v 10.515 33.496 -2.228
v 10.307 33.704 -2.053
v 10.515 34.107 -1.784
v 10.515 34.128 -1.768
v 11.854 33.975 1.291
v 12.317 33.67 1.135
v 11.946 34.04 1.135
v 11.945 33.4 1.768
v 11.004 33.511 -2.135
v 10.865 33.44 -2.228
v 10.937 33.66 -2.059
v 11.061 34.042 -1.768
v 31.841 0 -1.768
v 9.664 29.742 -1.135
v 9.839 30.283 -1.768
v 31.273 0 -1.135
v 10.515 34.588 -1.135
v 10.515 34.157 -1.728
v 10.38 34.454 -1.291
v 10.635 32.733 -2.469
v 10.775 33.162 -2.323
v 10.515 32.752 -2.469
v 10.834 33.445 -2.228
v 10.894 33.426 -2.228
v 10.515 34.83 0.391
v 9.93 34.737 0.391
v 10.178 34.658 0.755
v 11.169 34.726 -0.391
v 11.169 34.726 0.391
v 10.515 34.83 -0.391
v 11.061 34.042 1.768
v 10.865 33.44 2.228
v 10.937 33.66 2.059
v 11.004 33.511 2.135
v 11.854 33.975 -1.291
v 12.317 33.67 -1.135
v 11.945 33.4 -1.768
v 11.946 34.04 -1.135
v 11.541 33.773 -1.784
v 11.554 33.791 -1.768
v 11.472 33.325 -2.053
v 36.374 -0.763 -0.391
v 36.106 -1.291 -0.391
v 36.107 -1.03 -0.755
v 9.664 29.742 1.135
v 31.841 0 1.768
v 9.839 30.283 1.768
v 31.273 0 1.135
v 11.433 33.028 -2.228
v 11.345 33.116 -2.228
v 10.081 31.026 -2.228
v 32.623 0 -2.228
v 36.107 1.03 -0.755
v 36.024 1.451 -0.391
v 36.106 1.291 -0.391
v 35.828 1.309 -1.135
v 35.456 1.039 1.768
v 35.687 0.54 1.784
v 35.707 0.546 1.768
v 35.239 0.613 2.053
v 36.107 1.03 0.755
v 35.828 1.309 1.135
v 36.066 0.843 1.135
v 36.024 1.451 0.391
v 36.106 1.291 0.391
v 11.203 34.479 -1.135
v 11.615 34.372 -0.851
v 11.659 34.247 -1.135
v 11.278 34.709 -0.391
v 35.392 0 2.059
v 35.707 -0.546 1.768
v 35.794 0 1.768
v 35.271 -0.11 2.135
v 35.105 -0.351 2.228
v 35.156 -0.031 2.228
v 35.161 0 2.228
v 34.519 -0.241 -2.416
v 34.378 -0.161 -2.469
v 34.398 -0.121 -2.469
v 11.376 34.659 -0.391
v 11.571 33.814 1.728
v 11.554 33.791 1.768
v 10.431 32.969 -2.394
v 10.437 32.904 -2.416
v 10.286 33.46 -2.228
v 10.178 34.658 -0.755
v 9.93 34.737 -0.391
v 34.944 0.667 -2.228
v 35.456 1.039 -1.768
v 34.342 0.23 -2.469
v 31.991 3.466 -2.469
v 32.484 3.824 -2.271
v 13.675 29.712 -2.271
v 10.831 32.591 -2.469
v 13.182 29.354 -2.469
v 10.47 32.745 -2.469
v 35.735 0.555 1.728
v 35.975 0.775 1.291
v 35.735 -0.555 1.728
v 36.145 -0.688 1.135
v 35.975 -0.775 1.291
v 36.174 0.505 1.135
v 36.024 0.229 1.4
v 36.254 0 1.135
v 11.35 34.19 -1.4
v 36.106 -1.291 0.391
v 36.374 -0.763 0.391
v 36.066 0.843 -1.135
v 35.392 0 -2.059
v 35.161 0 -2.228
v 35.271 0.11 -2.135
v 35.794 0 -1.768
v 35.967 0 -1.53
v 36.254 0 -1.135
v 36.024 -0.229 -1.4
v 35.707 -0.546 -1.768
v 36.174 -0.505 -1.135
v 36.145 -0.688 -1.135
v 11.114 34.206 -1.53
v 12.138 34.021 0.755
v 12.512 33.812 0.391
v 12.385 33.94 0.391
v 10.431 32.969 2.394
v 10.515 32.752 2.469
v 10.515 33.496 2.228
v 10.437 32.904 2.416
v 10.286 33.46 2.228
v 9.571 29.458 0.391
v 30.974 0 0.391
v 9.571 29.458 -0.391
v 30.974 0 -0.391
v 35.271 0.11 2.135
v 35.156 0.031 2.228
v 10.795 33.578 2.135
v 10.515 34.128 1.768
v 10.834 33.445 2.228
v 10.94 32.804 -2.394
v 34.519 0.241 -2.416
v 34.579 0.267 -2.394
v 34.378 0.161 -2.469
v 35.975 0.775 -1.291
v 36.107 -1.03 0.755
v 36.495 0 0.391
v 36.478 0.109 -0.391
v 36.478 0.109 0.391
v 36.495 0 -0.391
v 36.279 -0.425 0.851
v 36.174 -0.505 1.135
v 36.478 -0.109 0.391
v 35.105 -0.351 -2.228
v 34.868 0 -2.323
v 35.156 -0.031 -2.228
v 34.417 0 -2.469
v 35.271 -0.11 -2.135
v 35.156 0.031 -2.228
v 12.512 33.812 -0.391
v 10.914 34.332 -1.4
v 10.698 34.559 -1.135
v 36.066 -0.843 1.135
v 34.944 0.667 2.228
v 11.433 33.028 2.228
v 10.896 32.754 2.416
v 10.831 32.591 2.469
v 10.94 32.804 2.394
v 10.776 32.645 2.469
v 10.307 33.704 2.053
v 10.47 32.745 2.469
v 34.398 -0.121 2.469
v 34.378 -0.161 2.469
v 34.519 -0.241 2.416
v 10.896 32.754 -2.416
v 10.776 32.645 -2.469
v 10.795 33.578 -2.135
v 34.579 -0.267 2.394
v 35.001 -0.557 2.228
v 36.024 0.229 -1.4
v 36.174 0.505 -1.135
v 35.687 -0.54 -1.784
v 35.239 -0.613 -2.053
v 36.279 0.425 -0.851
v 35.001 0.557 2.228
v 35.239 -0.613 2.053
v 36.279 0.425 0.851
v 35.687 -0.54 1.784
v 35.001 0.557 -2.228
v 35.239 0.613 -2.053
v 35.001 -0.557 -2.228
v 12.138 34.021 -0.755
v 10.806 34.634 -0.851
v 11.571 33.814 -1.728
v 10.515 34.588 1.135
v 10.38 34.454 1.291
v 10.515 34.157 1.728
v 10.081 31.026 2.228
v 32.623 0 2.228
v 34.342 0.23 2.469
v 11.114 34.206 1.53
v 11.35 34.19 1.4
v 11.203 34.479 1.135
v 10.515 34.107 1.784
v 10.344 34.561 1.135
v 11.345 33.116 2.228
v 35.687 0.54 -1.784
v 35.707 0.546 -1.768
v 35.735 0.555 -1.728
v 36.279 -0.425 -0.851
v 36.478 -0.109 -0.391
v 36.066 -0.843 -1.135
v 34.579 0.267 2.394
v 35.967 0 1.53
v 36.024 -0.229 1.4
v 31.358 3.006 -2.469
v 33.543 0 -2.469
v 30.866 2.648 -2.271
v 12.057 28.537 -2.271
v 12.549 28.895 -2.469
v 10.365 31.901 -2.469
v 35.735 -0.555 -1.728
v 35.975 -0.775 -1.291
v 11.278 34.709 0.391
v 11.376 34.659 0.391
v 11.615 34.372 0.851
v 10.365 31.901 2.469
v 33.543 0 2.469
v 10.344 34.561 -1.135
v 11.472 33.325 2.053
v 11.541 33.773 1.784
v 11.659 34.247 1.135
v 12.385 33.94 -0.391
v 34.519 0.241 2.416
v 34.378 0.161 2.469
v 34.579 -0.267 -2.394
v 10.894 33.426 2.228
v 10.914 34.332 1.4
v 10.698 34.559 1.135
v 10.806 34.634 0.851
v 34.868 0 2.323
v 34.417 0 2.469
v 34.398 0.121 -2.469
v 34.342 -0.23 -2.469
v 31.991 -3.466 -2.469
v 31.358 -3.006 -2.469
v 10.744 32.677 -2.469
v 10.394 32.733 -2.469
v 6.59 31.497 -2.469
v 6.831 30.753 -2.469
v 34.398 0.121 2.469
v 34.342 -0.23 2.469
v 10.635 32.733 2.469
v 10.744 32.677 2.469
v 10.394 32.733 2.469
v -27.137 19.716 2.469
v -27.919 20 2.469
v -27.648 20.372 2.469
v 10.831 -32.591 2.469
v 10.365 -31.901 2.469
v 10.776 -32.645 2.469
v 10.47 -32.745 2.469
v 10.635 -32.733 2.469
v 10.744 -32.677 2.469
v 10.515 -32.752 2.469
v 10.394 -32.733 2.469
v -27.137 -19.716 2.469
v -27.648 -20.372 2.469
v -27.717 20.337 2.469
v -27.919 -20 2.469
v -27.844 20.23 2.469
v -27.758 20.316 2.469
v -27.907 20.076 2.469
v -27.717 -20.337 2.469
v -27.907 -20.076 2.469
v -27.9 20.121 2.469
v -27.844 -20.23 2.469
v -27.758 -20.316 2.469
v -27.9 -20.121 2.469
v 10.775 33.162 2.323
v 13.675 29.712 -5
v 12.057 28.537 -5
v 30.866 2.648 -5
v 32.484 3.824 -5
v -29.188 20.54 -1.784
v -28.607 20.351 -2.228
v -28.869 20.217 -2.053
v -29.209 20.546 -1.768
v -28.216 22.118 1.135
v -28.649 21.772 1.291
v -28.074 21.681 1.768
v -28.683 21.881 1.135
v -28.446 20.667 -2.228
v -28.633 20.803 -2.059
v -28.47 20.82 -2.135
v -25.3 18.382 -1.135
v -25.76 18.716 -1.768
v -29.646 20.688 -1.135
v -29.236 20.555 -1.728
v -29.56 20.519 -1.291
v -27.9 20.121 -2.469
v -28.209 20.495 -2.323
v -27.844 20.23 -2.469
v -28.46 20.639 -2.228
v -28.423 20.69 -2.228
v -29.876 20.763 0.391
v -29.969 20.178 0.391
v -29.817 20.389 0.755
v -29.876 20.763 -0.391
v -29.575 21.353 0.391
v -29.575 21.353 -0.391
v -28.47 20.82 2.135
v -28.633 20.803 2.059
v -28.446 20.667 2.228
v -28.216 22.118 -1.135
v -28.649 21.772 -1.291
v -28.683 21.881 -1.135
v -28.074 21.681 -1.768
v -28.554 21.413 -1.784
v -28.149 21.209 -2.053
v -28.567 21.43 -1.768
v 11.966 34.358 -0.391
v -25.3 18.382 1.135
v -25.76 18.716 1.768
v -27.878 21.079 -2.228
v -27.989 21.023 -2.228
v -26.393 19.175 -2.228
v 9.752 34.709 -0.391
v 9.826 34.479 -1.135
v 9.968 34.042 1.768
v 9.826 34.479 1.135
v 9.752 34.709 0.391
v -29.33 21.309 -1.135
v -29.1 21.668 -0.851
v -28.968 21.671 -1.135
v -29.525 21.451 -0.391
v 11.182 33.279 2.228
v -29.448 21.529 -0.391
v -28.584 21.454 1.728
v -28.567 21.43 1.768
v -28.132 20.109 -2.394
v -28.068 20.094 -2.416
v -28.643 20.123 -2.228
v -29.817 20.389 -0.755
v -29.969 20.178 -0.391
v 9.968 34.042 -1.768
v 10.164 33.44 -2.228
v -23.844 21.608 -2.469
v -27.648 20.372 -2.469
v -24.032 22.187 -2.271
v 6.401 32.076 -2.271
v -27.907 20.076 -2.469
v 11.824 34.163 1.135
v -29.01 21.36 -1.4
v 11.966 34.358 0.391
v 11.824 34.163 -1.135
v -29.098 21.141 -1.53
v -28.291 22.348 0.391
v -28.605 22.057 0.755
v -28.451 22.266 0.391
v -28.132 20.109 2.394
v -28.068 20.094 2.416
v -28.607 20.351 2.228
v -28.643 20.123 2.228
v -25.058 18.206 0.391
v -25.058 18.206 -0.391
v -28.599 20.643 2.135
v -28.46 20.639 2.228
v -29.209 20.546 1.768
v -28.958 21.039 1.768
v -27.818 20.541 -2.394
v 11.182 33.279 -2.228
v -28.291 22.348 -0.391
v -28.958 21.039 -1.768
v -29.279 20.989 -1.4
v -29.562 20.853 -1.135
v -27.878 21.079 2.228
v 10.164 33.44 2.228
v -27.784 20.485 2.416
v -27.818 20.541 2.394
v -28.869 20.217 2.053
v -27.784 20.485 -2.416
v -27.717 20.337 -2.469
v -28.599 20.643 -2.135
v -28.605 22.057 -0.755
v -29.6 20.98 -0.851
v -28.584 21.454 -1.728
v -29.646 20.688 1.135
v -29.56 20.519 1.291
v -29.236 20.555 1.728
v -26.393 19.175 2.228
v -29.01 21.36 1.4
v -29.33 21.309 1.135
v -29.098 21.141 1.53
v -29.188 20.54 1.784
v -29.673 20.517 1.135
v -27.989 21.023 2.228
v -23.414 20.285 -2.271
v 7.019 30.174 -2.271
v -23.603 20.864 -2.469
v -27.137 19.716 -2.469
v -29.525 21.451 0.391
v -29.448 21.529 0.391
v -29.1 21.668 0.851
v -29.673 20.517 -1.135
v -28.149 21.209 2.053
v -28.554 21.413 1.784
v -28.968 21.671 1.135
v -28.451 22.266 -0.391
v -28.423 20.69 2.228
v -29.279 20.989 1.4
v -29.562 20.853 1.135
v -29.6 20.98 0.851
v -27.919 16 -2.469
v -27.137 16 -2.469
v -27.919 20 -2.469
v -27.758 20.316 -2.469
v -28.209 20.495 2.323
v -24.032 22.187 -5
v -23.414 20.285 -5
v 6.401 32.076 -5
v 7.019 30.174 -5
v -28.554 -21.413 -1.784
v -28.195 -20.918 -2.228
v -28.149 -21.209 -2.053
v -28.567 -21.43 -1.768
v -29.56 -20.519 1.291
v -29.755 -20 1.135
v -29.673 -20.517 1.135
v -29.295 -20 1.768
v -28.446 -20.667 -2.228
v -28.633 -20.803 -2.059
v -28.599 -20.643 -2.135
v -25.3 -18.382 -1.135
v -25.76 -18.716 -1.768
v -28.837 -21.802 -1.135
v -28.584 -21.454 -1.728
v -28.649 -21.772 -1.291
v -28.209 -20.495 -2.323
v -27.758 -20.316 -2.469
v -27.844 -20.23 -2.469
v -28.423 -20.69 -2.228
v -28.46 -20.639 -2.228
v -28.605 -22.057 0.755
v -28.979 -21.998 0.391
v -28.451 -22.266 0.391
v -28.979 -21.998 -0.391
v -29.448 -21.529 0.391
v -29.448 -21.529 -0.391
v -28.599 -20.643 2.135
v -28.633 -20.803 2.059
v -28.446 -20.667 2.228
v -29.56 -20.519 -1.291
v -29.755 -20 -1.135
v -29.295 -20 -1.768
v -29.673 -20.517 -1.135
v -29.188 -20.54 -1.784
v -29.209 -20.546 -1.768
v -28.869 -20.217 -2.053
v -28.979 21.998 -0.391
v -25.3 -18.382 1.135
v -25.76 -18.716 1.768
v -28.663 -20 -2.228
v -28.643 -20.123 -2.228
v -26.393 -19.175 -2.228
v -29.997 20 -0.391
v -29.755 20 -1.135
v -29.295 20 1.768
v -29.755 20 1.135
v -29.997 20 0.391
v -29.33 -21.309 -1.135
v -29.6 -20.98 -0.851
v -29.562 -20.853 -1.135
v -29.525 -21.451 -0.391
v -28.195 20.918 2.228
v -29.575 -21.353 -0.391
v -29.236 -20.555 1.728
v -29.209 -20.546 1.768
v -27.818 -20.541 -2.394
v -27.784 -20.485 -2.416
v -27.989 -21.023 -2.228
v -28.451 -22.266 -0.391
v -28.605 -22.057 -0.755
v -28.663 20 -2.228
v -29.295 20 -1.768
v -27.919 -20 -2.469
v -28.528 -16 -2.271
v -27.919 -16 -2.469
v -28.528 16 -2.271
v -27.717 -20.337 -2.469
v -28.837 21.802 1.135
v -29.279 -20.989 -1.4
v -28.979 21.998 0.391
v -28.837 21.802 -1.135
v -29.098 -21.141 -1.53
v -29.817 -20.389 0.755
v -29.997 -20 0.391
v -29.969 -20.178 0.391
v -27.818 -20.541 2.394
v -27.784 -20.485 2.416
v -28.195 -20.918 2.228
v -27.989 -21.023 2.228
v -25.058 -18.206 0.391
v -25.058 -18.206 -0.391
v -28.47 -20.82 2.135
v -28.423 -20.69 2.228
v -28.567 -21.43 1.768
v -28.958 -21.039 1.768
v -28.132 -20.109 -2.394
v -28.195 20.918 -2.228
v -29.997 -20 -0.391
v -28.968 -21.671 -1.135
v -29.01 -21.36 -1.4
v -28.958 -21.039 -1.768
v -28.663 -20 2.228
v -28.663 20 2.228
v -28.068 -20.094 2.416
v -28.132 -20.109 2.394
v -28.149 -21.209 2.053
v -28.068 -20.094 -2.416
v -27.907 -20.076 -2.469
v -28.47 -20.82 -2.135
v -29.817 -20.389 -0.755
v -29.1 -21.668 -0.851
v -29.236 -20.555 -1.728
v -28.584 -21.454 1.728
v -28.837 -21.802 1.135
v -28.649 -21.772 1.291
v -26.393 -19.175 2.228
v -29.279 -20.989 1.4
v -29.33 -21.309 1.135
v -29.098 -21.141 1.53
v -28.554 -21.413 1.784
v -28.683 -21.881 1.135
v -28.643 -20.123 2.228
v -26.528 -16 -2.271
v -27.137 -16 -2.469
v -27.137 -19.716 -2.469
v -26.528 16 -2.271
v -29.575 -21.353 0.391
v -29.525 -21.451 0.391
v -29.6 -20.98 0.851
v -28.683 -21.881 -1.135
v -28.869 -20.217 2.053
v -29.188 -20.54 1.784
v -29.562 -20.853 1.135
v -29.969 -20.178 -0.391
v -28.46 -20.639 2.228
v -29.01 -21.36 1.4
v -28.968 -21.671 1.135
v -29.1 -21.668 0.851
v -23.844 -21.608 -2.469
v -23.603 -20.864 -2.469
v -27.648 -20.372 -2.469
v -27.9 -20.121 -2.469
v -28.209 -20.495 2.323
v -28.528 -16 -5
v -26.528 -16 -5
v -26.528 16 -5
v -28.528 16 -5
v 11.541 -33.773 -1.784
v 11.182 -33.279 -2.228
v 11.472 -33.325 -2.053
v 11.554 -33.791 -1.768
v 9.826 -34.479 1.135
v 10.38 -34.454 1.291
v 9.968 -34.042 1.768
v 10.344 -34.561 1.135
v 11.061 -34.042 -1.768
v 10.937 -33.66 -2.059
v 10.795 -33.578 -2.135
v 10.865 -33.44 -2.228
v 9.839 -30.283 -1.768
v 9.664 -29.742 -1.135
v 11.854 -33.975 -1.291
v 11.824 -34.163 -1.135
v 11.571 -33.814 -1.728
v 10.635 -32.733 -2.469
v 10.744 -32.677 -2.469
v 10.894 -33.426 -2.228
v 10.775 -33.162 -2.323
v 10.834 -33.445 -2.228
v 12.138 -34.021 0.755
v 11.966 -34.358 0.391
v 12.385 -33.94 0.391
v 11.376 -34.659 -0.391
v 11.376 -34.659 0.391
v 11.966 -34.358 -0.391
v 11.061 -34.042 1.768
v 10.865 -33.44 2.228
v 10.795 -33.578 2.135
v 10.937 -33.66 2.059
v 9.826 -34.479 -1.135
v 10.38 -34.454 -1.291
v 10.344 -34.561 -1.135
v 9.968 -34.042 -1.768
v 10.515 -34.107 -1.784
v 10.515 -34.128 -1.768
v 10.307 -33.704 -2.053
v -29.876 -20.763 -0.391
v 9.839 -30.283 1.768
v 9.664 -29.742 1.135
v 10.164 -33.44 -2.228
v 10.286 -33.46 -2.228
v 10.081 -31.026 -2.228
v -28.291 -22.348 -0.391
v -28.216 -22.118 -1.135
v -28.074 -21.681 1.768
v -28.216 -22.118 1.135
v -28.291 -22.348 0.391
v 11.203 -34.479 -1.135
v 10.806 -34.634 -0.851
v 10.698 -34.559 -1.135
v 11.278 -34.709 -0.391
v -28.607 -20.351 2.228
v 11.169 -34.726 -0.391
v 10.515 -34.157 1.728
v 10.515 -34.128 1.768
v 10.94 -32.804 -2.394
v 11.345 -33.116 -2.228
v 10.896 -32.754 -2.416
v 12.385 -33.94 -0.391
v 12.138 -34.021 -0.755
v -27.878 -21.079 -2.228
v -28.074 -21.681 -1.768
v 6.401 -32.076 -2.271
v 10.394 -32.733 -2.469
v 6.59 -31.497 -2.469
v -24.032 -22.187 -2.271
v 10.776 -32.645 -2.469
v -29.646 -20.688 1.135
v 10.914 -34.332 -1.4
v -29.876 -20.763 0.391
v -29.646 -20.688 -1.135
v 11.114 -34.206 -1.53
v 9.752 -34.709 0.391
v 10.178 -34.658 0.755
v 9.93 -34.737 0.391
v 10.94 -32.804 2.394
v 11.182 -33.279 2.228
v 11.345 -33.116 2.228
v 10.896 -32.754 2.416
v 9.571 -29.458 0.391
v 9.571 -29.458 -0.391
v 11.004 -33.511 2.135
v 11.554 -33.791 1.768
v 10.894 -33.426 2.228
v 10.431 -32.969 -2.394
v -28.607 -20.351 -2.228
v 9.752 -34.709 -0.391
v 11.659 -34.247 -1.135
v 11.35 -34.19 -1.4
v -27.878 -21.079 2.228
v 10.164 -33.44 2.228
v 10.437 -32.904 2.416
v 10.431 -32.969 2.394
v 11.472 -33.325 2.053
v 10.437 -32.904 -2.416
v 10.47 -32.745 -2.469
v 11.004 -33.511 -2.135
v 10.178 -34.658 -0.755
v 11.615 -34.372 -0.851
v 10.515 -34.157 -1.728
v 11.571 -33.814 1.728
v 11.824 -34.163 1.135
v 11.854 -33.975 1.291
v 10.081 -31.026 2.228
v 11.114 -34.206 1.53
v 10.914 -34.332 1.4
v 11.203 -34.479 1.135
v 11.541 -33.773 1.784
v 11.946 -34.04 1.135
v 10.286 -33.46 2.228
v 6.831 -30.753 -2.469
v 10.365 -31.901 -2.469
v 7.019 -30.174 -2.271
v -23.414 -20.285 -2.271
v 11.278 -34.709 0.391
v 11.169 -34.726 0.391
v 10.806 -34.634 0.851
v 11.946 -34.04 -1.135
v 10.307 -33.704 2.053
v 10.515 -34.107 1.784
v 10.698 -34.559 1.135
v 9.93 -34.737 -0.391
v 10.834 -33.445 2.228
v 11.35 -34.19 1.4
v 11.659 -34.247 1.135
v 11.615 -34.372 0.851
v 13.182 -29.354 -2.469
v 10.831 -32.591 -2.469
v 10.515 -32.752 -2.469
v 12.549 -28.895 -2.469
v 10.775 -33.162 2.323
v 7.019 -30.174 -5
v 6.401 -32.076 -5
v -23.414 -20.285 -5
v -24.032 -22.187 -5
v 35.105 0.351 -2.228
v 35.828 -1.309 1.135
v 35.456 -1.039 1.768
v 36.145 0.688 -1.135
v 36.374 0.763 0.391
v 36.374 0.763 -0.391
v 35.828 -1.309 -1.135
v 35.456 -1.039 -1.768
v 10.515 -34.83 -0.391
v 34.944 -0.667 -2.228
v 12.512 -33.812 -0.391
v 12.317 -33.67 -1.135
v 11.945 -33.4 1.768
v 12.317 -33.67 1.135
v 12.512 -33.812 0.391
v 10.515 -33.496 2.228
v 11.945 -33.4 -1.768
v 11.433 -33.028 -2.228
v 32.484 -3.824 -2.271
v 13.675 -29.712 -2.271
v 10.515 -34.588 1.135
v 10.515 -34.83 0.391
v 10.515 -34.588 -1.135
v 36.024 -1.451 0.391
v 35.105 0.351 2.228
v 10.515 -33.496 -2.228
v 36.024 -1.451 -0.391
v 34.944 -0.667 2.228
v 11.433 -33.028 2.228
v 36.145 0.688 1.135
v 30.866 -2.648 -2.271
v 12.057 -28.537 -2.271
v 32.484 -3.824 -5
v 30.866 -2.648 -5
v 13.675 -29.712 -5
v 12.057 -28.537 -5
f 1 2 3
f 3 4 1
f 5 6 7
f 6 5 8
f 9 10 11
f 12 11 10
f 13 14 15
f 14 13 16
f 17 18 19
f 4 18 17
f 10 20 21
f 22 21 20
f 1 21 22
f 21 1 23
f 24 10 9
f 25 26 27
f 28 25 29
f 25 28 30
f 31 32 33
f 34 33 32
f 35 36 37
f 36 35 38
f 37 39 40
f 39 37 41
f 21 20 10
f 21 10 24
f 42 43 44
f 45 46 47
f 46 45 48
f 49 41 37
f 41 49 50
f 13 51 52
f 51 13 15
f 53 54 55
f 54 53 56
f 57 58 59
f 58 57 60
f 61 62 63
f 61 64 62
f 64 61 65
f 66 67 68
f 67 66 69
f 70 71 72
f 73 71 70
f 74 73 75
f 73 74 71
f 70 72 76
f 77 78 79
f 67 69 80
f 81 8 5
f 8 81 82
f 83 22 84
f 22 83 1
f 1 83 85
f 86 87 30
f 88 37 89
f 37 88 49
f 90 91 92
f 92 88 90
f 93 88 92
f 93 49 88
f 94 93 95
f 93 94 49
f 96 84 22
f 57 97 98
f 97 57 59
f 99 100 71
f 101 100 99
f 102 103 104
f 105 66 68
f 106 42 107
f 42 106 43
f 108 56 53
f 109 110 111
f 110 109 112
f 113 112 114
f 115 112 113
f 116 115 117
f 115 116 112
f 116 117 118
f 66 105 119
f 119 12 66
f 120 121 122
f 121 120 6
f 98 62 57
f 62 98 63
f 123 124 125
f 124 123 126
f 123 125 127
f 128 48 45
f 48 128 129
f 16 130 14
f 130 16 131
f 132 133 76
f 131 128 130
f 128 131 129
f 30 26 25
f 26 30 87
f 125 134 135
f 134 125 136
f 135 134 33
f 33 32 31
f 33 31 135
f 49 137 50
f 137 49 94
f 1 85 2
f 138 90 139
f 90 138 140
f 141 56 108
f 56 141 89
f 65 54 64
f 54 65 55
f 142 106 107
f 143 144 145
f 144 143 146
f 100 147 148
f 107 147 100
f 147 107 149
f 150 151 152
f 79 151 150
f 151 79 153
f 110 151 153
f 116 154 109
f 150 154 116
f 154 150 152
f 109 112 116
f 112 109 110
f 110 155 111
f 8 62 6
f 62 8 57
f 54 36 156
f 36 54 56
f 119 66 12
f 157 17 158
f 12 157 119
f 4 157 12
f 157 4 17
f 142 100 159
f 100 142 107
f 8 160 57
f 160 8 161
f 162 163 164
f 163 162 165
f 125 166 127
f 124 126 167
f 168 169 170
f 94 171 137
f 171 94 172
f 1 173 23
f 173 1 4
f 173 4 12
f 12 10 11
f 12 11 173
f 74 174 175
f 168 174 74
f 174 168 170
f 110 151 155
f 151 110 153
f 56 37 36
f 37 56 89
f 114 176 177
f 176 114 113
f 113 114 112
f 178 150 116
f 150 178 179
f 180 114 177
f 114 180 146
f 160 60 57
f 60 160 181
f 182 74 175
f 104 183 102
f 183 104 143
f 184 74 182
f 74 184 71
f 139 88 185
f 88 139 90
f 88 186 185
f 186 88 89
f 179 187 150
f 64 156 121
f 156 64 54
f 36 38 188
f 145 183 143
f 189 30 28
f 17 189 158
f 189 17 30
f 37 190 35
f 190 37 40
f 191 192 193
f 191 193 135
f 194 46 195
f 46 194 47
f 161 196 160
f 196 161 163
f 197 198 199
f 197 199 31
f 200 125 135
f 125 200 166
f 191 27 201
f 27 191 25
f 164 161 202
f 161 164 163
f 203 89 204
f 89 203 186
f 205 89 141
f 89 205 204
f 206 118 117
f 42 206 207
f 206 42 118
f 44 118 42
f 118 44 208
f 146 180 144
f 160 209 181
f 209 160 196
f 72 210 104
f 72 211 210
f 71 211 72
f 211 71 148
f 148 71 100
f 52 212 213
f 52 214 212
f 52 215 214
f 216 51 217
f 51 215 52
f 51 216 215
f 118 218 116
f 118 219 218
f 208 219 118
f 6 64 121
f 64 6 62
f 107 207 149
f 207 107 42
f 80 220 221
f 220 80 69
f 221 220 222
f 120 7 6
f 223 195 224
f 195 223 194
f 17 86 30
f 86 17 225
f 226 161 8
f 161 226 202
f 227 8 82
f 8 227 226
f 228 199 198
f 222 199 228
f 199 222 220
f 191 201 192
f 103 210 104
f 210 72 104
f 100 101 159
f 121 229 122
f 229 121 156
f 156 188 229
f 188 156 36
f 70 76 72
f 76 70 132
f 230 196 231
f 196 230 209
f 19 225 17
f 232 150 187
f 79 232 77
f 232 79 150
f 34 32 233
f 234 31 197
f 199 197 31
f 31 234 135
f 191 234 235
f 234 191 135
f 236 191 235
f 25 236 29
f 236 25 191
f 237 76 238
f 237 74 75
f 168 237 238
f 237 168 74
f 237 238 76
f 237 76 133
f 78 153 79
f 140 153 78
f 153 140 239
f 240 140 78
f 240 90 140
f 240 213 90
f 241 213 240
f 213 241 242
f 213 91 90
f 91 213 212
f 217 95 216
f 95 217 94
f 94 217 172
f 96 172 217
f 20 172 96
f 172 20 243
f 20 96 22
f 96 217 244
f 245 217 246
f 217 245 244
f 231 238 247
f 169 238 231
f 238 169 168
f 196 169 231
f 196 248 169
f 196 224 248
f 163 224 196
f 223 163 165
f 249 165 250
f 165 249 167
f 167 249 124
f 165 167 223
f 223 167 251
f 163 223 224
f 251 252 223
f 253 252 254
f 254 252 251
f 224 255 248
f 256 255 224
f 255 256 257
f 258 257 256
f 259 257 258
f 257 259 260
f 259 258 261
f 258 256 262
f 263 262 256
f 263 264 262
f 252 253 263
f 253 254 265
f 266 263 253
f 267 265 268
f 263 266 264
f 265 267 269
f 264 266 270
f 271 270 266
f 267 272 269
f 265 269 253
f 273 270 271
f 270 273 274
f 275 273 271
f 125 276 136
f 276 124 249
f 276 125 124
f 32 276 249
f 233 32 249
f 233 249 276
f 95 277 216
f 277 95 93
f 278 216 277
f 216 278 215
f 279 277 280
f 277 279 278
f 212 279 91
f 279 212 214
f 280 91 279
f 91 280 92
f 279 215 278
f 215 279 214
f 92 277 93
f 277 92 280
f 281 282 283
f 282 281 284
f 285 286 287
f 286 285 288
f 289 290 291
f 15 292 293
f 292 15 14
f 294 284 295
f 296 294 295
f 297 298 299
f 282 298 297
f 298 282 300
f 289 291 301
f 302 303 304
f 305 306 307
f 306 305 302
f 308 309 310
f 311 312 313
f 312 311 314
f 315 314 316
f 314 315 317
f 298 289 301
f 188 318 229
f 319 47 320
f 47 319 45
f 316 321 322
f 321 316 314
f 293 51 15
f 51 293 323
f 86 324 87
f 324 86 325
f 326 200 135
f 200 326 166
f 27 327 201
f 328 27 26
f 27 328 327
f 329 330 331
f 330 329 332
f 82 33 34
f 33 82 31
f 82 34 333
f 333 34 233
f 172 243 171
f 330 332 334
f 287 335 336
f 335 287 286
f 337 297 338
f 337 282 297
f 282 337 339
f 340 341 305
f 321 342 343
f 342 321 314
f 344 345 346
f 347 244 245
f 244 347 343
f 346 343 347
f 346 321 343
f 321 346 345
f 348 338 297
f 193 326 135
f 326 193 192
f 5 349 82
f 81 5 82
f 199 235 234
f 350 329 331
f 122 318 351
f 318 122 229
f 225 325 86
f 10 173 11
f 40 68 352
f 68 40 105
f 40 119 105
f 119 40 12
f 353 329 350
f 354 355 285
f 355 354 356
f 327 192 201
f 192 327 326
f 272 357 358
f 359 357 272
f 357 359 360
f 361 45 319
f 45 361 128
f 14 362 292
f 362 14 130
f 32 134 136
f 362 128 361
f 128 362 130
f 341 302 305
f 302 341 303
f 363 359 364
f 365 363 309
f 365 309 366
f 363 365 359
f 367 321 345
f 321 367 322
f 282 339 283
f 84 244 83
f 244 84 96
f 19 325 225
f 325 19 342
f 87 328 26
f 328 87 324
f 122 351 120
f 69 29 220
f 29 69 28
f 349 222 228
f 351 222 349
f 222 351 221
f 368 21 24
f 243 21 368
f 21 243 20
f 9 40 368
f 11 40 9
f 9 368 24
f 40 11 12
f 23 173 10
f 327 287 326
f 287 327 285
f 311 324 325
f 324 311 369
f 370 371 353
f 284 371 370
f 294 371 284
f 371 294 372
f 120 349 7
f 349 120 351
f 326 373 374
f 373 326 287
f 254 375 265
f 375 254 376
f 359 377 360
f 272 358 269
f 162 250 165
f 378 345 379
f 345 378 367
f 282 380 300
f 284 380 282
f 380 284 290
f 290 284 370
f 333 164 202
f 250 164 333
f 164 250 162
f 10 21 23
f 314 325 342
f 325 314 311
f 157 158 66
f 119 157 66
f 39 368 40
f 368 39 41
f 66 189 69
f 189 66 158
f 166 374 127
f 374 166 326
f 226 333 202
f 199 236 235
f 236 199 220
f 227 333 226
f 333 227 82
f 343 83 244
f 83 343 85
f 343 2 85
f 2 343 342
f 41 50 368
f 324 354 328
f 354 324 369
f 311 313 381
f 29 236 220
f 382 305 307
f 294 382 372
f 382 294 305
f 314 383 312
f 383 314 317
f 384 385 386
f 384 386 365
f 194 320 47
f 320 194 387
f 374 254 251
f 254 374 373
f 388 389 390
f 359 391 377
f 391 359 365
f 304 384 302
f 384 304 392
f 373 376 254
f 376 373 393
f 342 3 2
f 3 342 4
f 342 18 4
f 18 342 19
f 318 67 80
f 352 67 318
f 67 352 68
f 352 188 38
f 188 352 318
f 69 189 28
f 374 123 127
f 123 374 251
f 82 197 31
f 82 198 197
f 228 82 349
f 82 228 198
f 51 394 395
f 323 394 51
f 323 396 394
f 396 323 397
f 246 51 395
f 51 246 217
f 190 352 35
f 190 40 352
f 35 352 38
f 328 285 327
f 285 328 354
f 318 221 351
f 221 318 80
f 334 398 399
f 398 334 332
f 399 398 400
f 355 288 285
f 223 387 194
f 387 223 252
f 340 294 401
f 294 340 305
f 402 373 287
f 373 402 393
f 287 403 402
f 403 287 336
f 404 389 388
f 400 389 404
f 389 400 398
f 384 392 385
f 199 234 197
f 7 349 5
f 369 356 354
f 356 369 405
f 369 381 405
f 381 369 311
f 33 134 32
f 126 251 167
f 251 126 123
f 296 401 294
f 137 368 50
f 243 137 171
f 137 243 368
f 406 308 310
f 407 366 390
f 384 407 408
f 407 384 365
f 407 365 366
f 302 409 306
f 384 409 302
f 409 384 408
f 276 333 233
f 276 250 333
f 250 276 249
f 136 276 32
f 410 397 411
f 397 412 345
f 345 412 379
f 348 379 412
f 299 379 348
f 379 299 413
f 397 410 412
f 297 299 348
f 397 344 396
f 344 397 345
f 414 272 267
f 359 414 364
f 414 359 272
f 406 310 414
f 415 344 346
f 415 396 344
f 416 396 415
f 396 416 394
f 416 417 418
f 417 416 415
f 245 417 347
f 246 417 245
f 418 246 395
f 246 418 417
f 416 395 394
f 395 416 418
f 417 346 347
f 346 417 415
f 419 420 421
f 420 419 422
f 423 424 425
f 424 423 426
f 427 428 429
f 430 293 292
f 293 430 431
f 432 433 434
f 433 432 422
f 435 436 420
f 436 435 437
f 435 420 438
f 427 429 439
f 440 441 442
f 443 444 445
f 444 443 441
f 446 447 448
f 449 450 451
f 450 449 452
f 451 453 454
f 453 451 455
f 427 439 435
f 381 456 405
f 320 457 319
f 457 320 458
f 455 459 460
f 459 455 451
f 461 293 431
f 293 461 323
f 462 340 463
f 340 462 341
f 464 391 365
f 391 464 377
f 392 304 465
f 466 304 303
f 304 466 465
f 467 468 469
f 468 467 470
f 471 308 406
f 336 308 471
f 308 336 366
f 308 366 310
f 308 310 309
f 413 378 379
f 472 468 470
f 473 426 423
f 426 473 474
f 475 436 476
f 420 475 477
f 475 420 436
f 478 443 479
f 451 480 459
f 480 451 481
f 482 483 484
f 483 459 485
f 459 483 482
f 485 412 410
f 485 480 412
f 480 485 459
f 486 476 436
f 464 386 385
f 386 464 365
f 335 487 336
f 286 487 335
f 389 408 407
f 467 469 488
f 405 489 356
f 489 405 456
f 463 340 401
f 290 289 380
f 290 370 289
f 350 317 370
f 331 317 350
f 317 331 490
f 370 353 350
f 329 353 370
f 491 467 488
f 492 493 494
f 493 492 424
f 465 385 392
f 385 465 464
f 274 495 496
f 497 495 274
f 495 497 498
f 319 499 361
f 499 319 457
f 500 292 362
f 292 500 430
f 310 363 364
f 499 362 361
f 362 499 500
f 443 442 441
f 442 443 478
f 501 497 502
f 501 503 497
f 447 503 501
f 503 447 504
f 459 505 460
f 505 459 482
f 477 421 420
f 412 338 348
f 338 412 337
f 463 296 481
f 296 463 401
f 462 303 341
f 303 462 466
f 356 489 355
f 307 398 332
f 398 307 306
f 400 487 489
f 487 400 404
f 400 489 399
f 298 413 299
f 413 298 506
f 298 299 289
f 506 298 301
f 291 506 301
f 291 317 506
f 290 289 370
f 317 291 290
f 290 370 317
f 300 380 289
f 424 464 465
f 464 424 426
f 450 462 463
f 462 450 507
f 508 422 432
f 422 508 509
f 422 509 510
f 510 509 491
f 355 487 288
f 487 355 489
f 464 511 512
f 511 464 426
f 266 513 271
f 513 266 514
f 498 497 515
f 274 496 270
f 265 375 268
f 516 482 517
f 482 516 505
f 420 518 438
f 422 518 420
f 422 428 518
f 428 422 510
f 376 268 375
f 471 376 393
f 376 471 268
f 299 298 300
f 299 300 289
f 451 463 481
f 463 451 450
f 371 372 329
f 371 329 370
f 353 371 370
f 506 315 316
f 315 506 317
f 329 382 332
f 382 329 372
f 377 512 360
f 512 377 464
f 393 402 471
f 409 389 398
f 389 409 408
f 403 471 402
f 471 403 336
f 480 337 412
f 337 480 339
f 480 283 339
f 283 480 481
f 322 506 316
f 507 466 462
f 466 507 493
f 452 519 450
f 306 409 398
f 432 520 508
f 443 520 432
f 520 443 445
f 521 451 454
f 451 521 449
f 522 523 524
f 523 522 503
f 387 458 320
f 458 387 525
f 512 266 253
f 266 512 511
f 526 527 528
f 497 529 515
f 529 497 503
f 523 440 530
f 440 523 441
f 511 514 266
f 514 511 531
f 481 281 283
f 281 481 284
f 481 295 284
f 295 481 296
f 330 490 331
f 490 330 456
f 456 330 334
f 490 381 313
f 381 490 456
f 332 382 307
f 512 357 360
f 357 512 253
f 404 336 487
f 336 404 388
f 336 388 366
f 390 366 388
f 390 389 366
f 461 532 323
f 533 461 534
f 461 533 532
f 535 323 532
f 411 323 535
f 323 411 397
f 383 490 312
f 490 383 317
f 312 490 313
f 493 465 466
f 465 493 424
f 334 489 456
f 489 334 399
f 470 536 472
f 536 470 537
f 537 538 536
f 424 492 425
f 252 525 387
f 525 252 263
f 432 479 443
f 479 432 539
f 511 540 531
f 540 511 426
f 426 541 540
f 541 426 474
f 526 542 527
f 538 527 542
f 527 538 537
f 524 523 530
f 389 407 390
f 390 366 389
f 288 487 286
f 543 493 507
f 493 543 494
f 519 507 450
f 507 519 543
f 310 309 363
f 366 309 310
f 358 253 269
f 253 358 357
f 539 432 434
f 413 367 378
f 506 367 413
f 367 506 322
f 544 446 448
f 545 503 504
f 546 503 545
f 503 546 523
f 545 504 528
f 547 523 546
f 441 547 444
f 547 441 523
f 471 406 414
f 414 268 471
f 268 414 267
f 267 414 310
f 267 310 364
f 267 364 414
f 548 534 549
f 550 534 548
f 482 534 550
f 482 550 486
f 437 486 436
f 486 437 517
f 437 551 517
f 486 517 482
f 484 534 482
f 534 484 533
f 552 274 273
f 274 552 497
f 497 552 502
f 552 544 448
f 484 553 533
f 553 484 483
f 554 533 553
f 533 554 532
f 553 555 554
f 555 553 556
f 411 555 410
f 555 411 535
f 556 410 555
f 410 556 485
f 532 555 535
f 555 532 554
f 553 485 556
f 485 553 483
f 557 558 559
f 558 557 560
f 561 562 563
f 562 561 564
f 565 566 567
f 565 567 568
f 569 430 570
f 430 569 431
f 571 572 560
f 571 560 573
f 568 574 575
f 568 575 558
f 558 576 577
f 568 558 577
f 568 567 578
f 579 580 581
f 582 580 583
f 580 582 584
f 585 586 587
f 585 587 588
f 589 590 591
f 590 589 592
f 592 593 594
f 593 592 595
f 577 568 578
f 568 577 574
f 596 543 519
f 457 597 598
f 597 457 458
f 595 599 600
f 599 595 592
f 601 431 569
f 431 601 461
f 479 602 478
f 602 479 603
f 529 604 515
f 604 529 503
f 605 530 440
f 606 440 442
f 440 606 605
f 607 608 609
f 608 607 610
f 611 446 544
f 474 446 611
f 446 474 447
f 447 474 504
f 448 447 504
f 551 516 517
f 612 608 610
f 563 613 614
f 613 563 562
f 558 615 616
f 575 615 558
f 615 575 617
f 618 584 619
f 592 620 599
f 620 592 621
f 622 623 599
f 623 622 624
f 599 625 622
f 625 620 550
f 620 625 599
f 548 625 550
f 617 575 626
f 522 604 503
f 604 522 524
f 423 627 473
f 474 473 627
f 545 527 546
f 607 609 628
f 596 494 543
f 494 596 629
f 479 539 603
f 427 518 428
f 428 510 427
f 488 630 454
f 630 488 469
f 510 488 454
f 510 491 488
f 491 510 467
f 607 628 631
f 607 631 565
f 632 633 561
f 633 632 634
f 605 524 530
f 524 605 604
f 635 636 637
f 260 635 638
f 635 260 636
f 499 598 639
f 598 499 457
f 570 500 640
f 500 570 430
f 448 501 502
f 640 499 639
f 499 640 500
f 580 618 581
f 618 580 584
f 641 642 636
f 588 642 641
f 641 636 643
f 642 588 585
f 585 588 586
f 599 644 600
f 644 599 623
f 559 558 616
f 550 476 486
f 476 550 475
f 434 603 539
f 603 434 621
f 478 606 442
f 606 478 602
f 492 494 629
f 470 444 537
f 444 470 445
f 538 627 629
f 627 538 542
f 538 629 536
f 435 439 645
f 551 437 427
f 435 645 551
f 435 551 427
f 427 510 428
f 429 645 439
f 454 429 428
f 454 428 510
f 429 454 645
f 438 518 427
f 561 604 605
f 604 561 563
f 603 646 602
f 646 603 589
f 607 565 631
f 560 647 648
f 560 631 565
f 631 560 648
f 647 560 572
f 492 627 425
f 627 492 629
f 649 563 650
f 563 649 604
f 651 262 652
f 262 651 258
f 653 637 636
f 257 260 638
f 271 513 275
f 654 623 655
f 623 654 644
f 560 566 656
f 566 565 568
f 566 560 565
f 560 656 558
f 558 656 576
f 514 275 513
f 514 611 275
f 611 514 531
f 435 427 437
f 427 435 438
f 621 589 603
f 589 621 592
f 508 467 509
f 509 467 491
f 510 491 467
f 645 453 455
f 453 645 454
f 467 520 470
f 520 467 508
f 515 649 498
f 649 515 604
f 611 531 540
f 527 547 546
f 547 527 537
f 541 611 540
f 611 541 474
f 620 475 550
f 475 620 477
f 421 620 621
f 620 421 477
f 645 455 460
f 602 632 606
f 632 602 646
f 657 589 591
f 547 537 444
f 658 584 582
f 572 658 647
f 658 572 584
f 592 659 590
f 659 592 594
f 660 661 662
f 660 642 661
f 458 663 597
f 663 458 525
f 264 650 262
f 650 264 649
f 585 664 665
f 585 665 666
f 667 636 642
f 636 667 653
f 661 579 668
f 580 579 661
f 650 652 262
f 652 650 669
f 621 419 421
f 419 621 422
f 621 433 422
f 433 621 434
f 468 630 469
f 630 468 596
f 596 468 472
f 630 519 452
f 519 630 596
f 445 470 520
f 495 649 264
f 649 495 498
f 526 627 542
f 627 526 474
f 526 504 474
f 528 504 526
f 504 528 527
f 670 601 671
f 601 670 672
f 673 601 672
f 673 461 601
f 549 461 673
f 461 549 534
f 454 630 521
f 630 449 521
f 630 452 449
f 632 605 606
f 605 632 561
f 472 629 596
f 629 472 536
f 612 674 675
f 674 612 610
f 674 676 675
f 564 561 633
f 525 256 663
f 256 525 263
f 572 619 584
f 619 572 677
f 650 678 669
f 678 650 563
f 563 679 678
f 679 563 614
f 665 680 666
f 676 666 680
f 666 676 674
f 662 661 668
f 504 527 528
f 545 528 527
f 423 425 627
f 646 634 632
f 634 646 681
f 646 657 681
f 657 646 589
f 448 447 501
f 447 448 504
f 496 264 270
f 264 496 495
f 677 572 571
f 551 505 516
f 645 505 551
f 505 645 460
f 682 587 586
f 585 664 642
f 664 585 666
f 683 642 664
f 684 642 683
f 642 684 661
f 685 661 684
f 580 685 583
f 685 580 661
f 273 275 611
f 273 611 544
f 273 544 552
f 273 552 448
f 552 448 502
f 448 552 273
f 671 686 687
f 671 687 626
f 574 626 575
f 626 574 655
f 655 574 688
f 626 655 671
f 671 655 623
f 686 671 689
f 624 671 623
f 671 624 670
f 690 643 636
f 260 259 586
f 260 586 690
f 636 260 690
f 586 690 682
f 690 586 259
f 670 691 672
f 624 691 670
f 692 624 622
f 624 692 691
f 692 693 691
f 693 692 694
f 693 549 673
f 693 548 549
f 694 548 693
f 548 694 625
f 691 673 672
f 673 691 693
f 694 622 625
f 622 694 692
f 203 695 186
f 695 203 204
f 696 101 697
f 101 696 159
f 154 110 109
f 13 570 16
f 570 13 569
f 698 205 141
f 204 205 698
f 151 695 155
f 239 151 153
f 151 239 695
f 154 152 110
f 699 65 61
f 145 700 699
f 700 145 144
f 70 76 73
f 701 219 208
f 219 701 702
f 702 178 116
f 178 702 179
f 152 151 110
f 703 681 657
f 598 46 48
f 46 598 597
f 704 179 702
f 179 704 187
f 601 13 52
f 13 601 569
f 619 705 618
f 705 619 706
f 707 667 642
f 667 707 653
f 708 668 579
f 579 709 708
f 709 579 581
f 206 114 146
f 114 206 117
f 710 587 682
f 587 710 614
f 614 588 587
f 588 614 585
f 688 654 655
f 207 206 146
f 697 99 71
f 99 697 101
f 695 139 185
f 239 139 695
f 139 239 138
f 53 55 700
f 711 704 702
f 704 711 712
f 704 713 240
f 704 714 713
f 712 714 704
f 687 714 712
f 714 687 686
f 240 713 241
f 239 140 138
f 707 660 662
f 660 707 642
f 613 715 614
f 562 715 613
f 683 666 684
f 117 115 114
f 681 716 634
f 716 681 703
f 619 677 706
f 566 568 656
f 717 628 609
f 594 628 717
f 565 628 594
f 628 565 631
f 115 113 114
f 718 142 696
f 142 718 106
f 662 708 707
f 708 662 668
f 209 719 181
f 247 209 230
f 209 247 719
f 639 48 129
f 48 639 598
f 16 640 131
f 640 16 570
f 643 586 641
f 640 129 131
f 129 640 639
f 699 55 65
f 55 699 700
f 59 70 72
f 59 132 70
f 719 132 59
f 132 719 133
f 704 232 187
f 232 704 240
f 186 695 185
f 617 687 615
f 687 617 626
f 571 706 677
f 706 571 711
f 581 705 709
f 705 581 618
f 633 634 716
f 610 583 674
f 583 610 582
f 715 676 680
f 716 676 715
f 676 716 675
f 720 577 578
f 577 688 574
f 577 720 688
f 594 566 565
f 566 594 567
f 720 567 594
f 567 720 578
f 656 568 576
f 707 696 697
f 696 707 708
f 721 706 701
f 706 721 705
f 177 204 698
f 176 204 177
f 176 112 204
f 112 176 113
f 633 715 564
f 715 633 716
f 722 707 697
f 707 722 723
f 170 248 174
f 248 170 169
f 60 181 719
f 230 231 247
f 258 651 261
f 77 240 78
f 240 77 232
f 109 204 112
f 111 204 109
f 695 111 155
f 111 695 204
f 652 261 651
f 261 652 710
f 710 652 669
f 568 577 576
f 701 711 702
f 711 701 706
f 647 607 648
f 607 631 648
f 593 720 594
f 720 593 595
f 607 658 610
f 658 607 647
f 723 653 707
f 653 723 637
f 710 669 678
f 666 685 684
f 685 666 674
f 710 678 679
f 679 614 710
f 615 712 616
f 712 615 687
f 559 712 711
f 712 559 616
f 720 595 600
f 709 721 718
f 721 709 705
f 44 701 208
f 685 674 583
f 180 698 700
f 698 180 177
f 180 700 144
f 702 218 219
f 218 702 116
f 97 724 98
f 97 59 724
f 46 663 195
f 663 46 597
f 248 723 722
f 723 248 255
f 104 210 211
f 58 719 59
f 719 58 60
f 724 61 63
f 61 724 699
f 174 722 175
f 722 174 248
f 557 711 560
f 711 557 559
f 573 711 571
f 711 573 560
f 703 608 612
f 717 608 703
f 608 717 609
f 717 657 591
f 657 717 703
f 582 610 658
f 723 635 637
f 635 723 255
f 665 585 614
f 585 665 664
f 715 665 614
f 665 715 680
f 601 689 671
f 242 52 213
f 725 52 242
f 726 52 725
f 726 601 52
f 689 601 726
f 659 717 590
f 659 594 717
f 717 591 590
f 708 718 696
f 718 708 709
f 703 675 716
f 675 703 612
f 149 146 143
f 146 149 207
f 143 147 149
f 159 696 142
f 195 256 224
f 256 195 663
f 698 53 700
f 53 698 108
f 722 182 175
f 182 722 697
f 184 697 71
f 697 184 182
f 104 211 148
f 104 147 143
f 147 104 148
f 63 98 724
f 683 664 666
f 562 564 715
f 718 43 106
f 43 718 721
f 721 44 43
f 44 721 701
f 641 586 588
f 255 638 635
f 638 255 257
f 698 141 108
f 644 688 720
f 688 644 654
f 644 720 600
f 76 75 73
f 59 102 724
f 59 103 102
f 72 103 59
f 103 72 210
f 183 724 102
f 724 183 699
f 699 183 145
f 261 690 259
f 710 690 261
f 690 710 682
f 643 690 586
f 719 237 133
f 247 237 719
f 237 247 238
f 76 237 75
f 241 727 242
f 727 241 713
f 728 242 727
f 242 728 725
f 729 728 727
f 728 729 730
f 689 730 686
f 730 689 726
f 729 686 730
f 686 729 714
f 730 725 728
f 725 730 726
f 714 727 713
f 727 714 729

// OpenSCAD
// file: polygon-sym.scad
use <funcs.scad>

/**
Applies polygonal symmetry to the supplied children in the X-Y plane. The child objects are repeated to create an instance per vertex and rotating each so their X-axis points along the edge. 
*/
module apply_polygon_sym(n_vertex, polygon_rad) {
    rot_angle = 360 / n_vertex;
    turn_angle = 90 + rot_angle / 2; 
    for (i = [0: n_vertex-1]) {
        $pgn_edge_idx = i;
        rotate([0, 0, rot_angle * i]) {
            translate([polygon_rad, 0, 0]) {
                rotate([0, 0, turn_angle]) {
                    children();
                }
            }
        }
    }
}


module regular_polygon_2d(n_vertex, edge_len) {
    polygon_rad = calc_radius(n_vertex, edge_len);
    hull() {
        apply_polygon_sym(n_vertex, polygon_rad) {
            square(0.001);
        } 
    }
}

regular_polygon_2d(5, 20);
// file: funcs.scad
// Handy functions (and aliases)

function v_add(a, b)   = a + b;
function v_sub(a, b)   = a - b;
function v_scale(a, k) = a * k;             // scalar multiplication
function v_dot(a, b)   = a * b;             // dot product
function v_cross(a, b) = cross(a, b);       // OpenSCAD built-in
function v_len(a)      = norm(a);           // built-in length
function v_norm(a)     = let(L = norm(a)) (L == 0 ? [0,0,0] : a / L);

// Edge equality
function edge_equal(e1, e2) = (e1[0] == e2[0] && e1[1] == e2[1]);

/** Calculate polygon edge, given N and radius */ 
function calc_edge(n_vertex, rad) = 2 * rad * sin(180 / n_vertex);

/** Calculate polygon radius, given N and edge length */ 
function calc_radius(n_vertex, edge_len) = edge_len / (2 * sin(180 / n_vertex));

/** Sum of vector */
function sum(a, i = 0) = 
    i >= len(a) ? 0 : a[i] + sum(a, i + 1);

/** Sum of vector list (3D) */
function v_sum(list) = [
    sum([for (v = list) v[0]]),
    sum([for (v = list) v[1] ]),
    sum([for (v = list) v[2] ])
];
    
/** Face centroid from verts + index list */
function face_centroid(verts, f) =
    len(f) == 0
        ? [0,0,0]
        : v_scale(v_sum([for (vid = f) verts[vid]]), 1 / len(f));

// Face normal (not scaled, just direction)
function face_normal(verts, f) =
    v_norm(v_cross(
        verts[f[1]] - verts[f[0]],
        verts[f[2]] - verts[f[0]]
    ));
    
// main file
use <funcs.scad>
use <polygon-sym.scad>

EDGE_DIAM = 5;
EDGE_KEEL = 5;
EDGE_KEEL_T = 2;

$fn = 20;


module edge_mount(len, edge_diam = EDGE_DIAM) {
    hull() {
        sphere(d = edge_diam);
        translate([len, 0, 0]) sphere(d = edge_diam);
    }
    translate([EDGE_KEEL-1, -EDGE_KEEL_T/2, -EDGE_KEEL]) 
        cube([len-EDGE_KEEL*2+2, EDGE_KEEL_T, EDGE_KEEL]);
}

module regular_polygon_frame(n_vertex, edge_len) {
    polygon_rad = calc_radius(n_vertex, edge_len);
    apply_polygon_sym(n_vertex, polygon_rad) {
        edge_mount(edge_len);
    } 
}

module regular_polygon_2d(n_vertex, edge_len) {
    polygon_rad = calc_radius(n_vertex, edge_len);
    circle(r = polygon_rad, $fn = n_vertex);
}

regular_polygon_frame(5, 40);

translate([0,0,0]) regular_polygon_2d(5, 40);
